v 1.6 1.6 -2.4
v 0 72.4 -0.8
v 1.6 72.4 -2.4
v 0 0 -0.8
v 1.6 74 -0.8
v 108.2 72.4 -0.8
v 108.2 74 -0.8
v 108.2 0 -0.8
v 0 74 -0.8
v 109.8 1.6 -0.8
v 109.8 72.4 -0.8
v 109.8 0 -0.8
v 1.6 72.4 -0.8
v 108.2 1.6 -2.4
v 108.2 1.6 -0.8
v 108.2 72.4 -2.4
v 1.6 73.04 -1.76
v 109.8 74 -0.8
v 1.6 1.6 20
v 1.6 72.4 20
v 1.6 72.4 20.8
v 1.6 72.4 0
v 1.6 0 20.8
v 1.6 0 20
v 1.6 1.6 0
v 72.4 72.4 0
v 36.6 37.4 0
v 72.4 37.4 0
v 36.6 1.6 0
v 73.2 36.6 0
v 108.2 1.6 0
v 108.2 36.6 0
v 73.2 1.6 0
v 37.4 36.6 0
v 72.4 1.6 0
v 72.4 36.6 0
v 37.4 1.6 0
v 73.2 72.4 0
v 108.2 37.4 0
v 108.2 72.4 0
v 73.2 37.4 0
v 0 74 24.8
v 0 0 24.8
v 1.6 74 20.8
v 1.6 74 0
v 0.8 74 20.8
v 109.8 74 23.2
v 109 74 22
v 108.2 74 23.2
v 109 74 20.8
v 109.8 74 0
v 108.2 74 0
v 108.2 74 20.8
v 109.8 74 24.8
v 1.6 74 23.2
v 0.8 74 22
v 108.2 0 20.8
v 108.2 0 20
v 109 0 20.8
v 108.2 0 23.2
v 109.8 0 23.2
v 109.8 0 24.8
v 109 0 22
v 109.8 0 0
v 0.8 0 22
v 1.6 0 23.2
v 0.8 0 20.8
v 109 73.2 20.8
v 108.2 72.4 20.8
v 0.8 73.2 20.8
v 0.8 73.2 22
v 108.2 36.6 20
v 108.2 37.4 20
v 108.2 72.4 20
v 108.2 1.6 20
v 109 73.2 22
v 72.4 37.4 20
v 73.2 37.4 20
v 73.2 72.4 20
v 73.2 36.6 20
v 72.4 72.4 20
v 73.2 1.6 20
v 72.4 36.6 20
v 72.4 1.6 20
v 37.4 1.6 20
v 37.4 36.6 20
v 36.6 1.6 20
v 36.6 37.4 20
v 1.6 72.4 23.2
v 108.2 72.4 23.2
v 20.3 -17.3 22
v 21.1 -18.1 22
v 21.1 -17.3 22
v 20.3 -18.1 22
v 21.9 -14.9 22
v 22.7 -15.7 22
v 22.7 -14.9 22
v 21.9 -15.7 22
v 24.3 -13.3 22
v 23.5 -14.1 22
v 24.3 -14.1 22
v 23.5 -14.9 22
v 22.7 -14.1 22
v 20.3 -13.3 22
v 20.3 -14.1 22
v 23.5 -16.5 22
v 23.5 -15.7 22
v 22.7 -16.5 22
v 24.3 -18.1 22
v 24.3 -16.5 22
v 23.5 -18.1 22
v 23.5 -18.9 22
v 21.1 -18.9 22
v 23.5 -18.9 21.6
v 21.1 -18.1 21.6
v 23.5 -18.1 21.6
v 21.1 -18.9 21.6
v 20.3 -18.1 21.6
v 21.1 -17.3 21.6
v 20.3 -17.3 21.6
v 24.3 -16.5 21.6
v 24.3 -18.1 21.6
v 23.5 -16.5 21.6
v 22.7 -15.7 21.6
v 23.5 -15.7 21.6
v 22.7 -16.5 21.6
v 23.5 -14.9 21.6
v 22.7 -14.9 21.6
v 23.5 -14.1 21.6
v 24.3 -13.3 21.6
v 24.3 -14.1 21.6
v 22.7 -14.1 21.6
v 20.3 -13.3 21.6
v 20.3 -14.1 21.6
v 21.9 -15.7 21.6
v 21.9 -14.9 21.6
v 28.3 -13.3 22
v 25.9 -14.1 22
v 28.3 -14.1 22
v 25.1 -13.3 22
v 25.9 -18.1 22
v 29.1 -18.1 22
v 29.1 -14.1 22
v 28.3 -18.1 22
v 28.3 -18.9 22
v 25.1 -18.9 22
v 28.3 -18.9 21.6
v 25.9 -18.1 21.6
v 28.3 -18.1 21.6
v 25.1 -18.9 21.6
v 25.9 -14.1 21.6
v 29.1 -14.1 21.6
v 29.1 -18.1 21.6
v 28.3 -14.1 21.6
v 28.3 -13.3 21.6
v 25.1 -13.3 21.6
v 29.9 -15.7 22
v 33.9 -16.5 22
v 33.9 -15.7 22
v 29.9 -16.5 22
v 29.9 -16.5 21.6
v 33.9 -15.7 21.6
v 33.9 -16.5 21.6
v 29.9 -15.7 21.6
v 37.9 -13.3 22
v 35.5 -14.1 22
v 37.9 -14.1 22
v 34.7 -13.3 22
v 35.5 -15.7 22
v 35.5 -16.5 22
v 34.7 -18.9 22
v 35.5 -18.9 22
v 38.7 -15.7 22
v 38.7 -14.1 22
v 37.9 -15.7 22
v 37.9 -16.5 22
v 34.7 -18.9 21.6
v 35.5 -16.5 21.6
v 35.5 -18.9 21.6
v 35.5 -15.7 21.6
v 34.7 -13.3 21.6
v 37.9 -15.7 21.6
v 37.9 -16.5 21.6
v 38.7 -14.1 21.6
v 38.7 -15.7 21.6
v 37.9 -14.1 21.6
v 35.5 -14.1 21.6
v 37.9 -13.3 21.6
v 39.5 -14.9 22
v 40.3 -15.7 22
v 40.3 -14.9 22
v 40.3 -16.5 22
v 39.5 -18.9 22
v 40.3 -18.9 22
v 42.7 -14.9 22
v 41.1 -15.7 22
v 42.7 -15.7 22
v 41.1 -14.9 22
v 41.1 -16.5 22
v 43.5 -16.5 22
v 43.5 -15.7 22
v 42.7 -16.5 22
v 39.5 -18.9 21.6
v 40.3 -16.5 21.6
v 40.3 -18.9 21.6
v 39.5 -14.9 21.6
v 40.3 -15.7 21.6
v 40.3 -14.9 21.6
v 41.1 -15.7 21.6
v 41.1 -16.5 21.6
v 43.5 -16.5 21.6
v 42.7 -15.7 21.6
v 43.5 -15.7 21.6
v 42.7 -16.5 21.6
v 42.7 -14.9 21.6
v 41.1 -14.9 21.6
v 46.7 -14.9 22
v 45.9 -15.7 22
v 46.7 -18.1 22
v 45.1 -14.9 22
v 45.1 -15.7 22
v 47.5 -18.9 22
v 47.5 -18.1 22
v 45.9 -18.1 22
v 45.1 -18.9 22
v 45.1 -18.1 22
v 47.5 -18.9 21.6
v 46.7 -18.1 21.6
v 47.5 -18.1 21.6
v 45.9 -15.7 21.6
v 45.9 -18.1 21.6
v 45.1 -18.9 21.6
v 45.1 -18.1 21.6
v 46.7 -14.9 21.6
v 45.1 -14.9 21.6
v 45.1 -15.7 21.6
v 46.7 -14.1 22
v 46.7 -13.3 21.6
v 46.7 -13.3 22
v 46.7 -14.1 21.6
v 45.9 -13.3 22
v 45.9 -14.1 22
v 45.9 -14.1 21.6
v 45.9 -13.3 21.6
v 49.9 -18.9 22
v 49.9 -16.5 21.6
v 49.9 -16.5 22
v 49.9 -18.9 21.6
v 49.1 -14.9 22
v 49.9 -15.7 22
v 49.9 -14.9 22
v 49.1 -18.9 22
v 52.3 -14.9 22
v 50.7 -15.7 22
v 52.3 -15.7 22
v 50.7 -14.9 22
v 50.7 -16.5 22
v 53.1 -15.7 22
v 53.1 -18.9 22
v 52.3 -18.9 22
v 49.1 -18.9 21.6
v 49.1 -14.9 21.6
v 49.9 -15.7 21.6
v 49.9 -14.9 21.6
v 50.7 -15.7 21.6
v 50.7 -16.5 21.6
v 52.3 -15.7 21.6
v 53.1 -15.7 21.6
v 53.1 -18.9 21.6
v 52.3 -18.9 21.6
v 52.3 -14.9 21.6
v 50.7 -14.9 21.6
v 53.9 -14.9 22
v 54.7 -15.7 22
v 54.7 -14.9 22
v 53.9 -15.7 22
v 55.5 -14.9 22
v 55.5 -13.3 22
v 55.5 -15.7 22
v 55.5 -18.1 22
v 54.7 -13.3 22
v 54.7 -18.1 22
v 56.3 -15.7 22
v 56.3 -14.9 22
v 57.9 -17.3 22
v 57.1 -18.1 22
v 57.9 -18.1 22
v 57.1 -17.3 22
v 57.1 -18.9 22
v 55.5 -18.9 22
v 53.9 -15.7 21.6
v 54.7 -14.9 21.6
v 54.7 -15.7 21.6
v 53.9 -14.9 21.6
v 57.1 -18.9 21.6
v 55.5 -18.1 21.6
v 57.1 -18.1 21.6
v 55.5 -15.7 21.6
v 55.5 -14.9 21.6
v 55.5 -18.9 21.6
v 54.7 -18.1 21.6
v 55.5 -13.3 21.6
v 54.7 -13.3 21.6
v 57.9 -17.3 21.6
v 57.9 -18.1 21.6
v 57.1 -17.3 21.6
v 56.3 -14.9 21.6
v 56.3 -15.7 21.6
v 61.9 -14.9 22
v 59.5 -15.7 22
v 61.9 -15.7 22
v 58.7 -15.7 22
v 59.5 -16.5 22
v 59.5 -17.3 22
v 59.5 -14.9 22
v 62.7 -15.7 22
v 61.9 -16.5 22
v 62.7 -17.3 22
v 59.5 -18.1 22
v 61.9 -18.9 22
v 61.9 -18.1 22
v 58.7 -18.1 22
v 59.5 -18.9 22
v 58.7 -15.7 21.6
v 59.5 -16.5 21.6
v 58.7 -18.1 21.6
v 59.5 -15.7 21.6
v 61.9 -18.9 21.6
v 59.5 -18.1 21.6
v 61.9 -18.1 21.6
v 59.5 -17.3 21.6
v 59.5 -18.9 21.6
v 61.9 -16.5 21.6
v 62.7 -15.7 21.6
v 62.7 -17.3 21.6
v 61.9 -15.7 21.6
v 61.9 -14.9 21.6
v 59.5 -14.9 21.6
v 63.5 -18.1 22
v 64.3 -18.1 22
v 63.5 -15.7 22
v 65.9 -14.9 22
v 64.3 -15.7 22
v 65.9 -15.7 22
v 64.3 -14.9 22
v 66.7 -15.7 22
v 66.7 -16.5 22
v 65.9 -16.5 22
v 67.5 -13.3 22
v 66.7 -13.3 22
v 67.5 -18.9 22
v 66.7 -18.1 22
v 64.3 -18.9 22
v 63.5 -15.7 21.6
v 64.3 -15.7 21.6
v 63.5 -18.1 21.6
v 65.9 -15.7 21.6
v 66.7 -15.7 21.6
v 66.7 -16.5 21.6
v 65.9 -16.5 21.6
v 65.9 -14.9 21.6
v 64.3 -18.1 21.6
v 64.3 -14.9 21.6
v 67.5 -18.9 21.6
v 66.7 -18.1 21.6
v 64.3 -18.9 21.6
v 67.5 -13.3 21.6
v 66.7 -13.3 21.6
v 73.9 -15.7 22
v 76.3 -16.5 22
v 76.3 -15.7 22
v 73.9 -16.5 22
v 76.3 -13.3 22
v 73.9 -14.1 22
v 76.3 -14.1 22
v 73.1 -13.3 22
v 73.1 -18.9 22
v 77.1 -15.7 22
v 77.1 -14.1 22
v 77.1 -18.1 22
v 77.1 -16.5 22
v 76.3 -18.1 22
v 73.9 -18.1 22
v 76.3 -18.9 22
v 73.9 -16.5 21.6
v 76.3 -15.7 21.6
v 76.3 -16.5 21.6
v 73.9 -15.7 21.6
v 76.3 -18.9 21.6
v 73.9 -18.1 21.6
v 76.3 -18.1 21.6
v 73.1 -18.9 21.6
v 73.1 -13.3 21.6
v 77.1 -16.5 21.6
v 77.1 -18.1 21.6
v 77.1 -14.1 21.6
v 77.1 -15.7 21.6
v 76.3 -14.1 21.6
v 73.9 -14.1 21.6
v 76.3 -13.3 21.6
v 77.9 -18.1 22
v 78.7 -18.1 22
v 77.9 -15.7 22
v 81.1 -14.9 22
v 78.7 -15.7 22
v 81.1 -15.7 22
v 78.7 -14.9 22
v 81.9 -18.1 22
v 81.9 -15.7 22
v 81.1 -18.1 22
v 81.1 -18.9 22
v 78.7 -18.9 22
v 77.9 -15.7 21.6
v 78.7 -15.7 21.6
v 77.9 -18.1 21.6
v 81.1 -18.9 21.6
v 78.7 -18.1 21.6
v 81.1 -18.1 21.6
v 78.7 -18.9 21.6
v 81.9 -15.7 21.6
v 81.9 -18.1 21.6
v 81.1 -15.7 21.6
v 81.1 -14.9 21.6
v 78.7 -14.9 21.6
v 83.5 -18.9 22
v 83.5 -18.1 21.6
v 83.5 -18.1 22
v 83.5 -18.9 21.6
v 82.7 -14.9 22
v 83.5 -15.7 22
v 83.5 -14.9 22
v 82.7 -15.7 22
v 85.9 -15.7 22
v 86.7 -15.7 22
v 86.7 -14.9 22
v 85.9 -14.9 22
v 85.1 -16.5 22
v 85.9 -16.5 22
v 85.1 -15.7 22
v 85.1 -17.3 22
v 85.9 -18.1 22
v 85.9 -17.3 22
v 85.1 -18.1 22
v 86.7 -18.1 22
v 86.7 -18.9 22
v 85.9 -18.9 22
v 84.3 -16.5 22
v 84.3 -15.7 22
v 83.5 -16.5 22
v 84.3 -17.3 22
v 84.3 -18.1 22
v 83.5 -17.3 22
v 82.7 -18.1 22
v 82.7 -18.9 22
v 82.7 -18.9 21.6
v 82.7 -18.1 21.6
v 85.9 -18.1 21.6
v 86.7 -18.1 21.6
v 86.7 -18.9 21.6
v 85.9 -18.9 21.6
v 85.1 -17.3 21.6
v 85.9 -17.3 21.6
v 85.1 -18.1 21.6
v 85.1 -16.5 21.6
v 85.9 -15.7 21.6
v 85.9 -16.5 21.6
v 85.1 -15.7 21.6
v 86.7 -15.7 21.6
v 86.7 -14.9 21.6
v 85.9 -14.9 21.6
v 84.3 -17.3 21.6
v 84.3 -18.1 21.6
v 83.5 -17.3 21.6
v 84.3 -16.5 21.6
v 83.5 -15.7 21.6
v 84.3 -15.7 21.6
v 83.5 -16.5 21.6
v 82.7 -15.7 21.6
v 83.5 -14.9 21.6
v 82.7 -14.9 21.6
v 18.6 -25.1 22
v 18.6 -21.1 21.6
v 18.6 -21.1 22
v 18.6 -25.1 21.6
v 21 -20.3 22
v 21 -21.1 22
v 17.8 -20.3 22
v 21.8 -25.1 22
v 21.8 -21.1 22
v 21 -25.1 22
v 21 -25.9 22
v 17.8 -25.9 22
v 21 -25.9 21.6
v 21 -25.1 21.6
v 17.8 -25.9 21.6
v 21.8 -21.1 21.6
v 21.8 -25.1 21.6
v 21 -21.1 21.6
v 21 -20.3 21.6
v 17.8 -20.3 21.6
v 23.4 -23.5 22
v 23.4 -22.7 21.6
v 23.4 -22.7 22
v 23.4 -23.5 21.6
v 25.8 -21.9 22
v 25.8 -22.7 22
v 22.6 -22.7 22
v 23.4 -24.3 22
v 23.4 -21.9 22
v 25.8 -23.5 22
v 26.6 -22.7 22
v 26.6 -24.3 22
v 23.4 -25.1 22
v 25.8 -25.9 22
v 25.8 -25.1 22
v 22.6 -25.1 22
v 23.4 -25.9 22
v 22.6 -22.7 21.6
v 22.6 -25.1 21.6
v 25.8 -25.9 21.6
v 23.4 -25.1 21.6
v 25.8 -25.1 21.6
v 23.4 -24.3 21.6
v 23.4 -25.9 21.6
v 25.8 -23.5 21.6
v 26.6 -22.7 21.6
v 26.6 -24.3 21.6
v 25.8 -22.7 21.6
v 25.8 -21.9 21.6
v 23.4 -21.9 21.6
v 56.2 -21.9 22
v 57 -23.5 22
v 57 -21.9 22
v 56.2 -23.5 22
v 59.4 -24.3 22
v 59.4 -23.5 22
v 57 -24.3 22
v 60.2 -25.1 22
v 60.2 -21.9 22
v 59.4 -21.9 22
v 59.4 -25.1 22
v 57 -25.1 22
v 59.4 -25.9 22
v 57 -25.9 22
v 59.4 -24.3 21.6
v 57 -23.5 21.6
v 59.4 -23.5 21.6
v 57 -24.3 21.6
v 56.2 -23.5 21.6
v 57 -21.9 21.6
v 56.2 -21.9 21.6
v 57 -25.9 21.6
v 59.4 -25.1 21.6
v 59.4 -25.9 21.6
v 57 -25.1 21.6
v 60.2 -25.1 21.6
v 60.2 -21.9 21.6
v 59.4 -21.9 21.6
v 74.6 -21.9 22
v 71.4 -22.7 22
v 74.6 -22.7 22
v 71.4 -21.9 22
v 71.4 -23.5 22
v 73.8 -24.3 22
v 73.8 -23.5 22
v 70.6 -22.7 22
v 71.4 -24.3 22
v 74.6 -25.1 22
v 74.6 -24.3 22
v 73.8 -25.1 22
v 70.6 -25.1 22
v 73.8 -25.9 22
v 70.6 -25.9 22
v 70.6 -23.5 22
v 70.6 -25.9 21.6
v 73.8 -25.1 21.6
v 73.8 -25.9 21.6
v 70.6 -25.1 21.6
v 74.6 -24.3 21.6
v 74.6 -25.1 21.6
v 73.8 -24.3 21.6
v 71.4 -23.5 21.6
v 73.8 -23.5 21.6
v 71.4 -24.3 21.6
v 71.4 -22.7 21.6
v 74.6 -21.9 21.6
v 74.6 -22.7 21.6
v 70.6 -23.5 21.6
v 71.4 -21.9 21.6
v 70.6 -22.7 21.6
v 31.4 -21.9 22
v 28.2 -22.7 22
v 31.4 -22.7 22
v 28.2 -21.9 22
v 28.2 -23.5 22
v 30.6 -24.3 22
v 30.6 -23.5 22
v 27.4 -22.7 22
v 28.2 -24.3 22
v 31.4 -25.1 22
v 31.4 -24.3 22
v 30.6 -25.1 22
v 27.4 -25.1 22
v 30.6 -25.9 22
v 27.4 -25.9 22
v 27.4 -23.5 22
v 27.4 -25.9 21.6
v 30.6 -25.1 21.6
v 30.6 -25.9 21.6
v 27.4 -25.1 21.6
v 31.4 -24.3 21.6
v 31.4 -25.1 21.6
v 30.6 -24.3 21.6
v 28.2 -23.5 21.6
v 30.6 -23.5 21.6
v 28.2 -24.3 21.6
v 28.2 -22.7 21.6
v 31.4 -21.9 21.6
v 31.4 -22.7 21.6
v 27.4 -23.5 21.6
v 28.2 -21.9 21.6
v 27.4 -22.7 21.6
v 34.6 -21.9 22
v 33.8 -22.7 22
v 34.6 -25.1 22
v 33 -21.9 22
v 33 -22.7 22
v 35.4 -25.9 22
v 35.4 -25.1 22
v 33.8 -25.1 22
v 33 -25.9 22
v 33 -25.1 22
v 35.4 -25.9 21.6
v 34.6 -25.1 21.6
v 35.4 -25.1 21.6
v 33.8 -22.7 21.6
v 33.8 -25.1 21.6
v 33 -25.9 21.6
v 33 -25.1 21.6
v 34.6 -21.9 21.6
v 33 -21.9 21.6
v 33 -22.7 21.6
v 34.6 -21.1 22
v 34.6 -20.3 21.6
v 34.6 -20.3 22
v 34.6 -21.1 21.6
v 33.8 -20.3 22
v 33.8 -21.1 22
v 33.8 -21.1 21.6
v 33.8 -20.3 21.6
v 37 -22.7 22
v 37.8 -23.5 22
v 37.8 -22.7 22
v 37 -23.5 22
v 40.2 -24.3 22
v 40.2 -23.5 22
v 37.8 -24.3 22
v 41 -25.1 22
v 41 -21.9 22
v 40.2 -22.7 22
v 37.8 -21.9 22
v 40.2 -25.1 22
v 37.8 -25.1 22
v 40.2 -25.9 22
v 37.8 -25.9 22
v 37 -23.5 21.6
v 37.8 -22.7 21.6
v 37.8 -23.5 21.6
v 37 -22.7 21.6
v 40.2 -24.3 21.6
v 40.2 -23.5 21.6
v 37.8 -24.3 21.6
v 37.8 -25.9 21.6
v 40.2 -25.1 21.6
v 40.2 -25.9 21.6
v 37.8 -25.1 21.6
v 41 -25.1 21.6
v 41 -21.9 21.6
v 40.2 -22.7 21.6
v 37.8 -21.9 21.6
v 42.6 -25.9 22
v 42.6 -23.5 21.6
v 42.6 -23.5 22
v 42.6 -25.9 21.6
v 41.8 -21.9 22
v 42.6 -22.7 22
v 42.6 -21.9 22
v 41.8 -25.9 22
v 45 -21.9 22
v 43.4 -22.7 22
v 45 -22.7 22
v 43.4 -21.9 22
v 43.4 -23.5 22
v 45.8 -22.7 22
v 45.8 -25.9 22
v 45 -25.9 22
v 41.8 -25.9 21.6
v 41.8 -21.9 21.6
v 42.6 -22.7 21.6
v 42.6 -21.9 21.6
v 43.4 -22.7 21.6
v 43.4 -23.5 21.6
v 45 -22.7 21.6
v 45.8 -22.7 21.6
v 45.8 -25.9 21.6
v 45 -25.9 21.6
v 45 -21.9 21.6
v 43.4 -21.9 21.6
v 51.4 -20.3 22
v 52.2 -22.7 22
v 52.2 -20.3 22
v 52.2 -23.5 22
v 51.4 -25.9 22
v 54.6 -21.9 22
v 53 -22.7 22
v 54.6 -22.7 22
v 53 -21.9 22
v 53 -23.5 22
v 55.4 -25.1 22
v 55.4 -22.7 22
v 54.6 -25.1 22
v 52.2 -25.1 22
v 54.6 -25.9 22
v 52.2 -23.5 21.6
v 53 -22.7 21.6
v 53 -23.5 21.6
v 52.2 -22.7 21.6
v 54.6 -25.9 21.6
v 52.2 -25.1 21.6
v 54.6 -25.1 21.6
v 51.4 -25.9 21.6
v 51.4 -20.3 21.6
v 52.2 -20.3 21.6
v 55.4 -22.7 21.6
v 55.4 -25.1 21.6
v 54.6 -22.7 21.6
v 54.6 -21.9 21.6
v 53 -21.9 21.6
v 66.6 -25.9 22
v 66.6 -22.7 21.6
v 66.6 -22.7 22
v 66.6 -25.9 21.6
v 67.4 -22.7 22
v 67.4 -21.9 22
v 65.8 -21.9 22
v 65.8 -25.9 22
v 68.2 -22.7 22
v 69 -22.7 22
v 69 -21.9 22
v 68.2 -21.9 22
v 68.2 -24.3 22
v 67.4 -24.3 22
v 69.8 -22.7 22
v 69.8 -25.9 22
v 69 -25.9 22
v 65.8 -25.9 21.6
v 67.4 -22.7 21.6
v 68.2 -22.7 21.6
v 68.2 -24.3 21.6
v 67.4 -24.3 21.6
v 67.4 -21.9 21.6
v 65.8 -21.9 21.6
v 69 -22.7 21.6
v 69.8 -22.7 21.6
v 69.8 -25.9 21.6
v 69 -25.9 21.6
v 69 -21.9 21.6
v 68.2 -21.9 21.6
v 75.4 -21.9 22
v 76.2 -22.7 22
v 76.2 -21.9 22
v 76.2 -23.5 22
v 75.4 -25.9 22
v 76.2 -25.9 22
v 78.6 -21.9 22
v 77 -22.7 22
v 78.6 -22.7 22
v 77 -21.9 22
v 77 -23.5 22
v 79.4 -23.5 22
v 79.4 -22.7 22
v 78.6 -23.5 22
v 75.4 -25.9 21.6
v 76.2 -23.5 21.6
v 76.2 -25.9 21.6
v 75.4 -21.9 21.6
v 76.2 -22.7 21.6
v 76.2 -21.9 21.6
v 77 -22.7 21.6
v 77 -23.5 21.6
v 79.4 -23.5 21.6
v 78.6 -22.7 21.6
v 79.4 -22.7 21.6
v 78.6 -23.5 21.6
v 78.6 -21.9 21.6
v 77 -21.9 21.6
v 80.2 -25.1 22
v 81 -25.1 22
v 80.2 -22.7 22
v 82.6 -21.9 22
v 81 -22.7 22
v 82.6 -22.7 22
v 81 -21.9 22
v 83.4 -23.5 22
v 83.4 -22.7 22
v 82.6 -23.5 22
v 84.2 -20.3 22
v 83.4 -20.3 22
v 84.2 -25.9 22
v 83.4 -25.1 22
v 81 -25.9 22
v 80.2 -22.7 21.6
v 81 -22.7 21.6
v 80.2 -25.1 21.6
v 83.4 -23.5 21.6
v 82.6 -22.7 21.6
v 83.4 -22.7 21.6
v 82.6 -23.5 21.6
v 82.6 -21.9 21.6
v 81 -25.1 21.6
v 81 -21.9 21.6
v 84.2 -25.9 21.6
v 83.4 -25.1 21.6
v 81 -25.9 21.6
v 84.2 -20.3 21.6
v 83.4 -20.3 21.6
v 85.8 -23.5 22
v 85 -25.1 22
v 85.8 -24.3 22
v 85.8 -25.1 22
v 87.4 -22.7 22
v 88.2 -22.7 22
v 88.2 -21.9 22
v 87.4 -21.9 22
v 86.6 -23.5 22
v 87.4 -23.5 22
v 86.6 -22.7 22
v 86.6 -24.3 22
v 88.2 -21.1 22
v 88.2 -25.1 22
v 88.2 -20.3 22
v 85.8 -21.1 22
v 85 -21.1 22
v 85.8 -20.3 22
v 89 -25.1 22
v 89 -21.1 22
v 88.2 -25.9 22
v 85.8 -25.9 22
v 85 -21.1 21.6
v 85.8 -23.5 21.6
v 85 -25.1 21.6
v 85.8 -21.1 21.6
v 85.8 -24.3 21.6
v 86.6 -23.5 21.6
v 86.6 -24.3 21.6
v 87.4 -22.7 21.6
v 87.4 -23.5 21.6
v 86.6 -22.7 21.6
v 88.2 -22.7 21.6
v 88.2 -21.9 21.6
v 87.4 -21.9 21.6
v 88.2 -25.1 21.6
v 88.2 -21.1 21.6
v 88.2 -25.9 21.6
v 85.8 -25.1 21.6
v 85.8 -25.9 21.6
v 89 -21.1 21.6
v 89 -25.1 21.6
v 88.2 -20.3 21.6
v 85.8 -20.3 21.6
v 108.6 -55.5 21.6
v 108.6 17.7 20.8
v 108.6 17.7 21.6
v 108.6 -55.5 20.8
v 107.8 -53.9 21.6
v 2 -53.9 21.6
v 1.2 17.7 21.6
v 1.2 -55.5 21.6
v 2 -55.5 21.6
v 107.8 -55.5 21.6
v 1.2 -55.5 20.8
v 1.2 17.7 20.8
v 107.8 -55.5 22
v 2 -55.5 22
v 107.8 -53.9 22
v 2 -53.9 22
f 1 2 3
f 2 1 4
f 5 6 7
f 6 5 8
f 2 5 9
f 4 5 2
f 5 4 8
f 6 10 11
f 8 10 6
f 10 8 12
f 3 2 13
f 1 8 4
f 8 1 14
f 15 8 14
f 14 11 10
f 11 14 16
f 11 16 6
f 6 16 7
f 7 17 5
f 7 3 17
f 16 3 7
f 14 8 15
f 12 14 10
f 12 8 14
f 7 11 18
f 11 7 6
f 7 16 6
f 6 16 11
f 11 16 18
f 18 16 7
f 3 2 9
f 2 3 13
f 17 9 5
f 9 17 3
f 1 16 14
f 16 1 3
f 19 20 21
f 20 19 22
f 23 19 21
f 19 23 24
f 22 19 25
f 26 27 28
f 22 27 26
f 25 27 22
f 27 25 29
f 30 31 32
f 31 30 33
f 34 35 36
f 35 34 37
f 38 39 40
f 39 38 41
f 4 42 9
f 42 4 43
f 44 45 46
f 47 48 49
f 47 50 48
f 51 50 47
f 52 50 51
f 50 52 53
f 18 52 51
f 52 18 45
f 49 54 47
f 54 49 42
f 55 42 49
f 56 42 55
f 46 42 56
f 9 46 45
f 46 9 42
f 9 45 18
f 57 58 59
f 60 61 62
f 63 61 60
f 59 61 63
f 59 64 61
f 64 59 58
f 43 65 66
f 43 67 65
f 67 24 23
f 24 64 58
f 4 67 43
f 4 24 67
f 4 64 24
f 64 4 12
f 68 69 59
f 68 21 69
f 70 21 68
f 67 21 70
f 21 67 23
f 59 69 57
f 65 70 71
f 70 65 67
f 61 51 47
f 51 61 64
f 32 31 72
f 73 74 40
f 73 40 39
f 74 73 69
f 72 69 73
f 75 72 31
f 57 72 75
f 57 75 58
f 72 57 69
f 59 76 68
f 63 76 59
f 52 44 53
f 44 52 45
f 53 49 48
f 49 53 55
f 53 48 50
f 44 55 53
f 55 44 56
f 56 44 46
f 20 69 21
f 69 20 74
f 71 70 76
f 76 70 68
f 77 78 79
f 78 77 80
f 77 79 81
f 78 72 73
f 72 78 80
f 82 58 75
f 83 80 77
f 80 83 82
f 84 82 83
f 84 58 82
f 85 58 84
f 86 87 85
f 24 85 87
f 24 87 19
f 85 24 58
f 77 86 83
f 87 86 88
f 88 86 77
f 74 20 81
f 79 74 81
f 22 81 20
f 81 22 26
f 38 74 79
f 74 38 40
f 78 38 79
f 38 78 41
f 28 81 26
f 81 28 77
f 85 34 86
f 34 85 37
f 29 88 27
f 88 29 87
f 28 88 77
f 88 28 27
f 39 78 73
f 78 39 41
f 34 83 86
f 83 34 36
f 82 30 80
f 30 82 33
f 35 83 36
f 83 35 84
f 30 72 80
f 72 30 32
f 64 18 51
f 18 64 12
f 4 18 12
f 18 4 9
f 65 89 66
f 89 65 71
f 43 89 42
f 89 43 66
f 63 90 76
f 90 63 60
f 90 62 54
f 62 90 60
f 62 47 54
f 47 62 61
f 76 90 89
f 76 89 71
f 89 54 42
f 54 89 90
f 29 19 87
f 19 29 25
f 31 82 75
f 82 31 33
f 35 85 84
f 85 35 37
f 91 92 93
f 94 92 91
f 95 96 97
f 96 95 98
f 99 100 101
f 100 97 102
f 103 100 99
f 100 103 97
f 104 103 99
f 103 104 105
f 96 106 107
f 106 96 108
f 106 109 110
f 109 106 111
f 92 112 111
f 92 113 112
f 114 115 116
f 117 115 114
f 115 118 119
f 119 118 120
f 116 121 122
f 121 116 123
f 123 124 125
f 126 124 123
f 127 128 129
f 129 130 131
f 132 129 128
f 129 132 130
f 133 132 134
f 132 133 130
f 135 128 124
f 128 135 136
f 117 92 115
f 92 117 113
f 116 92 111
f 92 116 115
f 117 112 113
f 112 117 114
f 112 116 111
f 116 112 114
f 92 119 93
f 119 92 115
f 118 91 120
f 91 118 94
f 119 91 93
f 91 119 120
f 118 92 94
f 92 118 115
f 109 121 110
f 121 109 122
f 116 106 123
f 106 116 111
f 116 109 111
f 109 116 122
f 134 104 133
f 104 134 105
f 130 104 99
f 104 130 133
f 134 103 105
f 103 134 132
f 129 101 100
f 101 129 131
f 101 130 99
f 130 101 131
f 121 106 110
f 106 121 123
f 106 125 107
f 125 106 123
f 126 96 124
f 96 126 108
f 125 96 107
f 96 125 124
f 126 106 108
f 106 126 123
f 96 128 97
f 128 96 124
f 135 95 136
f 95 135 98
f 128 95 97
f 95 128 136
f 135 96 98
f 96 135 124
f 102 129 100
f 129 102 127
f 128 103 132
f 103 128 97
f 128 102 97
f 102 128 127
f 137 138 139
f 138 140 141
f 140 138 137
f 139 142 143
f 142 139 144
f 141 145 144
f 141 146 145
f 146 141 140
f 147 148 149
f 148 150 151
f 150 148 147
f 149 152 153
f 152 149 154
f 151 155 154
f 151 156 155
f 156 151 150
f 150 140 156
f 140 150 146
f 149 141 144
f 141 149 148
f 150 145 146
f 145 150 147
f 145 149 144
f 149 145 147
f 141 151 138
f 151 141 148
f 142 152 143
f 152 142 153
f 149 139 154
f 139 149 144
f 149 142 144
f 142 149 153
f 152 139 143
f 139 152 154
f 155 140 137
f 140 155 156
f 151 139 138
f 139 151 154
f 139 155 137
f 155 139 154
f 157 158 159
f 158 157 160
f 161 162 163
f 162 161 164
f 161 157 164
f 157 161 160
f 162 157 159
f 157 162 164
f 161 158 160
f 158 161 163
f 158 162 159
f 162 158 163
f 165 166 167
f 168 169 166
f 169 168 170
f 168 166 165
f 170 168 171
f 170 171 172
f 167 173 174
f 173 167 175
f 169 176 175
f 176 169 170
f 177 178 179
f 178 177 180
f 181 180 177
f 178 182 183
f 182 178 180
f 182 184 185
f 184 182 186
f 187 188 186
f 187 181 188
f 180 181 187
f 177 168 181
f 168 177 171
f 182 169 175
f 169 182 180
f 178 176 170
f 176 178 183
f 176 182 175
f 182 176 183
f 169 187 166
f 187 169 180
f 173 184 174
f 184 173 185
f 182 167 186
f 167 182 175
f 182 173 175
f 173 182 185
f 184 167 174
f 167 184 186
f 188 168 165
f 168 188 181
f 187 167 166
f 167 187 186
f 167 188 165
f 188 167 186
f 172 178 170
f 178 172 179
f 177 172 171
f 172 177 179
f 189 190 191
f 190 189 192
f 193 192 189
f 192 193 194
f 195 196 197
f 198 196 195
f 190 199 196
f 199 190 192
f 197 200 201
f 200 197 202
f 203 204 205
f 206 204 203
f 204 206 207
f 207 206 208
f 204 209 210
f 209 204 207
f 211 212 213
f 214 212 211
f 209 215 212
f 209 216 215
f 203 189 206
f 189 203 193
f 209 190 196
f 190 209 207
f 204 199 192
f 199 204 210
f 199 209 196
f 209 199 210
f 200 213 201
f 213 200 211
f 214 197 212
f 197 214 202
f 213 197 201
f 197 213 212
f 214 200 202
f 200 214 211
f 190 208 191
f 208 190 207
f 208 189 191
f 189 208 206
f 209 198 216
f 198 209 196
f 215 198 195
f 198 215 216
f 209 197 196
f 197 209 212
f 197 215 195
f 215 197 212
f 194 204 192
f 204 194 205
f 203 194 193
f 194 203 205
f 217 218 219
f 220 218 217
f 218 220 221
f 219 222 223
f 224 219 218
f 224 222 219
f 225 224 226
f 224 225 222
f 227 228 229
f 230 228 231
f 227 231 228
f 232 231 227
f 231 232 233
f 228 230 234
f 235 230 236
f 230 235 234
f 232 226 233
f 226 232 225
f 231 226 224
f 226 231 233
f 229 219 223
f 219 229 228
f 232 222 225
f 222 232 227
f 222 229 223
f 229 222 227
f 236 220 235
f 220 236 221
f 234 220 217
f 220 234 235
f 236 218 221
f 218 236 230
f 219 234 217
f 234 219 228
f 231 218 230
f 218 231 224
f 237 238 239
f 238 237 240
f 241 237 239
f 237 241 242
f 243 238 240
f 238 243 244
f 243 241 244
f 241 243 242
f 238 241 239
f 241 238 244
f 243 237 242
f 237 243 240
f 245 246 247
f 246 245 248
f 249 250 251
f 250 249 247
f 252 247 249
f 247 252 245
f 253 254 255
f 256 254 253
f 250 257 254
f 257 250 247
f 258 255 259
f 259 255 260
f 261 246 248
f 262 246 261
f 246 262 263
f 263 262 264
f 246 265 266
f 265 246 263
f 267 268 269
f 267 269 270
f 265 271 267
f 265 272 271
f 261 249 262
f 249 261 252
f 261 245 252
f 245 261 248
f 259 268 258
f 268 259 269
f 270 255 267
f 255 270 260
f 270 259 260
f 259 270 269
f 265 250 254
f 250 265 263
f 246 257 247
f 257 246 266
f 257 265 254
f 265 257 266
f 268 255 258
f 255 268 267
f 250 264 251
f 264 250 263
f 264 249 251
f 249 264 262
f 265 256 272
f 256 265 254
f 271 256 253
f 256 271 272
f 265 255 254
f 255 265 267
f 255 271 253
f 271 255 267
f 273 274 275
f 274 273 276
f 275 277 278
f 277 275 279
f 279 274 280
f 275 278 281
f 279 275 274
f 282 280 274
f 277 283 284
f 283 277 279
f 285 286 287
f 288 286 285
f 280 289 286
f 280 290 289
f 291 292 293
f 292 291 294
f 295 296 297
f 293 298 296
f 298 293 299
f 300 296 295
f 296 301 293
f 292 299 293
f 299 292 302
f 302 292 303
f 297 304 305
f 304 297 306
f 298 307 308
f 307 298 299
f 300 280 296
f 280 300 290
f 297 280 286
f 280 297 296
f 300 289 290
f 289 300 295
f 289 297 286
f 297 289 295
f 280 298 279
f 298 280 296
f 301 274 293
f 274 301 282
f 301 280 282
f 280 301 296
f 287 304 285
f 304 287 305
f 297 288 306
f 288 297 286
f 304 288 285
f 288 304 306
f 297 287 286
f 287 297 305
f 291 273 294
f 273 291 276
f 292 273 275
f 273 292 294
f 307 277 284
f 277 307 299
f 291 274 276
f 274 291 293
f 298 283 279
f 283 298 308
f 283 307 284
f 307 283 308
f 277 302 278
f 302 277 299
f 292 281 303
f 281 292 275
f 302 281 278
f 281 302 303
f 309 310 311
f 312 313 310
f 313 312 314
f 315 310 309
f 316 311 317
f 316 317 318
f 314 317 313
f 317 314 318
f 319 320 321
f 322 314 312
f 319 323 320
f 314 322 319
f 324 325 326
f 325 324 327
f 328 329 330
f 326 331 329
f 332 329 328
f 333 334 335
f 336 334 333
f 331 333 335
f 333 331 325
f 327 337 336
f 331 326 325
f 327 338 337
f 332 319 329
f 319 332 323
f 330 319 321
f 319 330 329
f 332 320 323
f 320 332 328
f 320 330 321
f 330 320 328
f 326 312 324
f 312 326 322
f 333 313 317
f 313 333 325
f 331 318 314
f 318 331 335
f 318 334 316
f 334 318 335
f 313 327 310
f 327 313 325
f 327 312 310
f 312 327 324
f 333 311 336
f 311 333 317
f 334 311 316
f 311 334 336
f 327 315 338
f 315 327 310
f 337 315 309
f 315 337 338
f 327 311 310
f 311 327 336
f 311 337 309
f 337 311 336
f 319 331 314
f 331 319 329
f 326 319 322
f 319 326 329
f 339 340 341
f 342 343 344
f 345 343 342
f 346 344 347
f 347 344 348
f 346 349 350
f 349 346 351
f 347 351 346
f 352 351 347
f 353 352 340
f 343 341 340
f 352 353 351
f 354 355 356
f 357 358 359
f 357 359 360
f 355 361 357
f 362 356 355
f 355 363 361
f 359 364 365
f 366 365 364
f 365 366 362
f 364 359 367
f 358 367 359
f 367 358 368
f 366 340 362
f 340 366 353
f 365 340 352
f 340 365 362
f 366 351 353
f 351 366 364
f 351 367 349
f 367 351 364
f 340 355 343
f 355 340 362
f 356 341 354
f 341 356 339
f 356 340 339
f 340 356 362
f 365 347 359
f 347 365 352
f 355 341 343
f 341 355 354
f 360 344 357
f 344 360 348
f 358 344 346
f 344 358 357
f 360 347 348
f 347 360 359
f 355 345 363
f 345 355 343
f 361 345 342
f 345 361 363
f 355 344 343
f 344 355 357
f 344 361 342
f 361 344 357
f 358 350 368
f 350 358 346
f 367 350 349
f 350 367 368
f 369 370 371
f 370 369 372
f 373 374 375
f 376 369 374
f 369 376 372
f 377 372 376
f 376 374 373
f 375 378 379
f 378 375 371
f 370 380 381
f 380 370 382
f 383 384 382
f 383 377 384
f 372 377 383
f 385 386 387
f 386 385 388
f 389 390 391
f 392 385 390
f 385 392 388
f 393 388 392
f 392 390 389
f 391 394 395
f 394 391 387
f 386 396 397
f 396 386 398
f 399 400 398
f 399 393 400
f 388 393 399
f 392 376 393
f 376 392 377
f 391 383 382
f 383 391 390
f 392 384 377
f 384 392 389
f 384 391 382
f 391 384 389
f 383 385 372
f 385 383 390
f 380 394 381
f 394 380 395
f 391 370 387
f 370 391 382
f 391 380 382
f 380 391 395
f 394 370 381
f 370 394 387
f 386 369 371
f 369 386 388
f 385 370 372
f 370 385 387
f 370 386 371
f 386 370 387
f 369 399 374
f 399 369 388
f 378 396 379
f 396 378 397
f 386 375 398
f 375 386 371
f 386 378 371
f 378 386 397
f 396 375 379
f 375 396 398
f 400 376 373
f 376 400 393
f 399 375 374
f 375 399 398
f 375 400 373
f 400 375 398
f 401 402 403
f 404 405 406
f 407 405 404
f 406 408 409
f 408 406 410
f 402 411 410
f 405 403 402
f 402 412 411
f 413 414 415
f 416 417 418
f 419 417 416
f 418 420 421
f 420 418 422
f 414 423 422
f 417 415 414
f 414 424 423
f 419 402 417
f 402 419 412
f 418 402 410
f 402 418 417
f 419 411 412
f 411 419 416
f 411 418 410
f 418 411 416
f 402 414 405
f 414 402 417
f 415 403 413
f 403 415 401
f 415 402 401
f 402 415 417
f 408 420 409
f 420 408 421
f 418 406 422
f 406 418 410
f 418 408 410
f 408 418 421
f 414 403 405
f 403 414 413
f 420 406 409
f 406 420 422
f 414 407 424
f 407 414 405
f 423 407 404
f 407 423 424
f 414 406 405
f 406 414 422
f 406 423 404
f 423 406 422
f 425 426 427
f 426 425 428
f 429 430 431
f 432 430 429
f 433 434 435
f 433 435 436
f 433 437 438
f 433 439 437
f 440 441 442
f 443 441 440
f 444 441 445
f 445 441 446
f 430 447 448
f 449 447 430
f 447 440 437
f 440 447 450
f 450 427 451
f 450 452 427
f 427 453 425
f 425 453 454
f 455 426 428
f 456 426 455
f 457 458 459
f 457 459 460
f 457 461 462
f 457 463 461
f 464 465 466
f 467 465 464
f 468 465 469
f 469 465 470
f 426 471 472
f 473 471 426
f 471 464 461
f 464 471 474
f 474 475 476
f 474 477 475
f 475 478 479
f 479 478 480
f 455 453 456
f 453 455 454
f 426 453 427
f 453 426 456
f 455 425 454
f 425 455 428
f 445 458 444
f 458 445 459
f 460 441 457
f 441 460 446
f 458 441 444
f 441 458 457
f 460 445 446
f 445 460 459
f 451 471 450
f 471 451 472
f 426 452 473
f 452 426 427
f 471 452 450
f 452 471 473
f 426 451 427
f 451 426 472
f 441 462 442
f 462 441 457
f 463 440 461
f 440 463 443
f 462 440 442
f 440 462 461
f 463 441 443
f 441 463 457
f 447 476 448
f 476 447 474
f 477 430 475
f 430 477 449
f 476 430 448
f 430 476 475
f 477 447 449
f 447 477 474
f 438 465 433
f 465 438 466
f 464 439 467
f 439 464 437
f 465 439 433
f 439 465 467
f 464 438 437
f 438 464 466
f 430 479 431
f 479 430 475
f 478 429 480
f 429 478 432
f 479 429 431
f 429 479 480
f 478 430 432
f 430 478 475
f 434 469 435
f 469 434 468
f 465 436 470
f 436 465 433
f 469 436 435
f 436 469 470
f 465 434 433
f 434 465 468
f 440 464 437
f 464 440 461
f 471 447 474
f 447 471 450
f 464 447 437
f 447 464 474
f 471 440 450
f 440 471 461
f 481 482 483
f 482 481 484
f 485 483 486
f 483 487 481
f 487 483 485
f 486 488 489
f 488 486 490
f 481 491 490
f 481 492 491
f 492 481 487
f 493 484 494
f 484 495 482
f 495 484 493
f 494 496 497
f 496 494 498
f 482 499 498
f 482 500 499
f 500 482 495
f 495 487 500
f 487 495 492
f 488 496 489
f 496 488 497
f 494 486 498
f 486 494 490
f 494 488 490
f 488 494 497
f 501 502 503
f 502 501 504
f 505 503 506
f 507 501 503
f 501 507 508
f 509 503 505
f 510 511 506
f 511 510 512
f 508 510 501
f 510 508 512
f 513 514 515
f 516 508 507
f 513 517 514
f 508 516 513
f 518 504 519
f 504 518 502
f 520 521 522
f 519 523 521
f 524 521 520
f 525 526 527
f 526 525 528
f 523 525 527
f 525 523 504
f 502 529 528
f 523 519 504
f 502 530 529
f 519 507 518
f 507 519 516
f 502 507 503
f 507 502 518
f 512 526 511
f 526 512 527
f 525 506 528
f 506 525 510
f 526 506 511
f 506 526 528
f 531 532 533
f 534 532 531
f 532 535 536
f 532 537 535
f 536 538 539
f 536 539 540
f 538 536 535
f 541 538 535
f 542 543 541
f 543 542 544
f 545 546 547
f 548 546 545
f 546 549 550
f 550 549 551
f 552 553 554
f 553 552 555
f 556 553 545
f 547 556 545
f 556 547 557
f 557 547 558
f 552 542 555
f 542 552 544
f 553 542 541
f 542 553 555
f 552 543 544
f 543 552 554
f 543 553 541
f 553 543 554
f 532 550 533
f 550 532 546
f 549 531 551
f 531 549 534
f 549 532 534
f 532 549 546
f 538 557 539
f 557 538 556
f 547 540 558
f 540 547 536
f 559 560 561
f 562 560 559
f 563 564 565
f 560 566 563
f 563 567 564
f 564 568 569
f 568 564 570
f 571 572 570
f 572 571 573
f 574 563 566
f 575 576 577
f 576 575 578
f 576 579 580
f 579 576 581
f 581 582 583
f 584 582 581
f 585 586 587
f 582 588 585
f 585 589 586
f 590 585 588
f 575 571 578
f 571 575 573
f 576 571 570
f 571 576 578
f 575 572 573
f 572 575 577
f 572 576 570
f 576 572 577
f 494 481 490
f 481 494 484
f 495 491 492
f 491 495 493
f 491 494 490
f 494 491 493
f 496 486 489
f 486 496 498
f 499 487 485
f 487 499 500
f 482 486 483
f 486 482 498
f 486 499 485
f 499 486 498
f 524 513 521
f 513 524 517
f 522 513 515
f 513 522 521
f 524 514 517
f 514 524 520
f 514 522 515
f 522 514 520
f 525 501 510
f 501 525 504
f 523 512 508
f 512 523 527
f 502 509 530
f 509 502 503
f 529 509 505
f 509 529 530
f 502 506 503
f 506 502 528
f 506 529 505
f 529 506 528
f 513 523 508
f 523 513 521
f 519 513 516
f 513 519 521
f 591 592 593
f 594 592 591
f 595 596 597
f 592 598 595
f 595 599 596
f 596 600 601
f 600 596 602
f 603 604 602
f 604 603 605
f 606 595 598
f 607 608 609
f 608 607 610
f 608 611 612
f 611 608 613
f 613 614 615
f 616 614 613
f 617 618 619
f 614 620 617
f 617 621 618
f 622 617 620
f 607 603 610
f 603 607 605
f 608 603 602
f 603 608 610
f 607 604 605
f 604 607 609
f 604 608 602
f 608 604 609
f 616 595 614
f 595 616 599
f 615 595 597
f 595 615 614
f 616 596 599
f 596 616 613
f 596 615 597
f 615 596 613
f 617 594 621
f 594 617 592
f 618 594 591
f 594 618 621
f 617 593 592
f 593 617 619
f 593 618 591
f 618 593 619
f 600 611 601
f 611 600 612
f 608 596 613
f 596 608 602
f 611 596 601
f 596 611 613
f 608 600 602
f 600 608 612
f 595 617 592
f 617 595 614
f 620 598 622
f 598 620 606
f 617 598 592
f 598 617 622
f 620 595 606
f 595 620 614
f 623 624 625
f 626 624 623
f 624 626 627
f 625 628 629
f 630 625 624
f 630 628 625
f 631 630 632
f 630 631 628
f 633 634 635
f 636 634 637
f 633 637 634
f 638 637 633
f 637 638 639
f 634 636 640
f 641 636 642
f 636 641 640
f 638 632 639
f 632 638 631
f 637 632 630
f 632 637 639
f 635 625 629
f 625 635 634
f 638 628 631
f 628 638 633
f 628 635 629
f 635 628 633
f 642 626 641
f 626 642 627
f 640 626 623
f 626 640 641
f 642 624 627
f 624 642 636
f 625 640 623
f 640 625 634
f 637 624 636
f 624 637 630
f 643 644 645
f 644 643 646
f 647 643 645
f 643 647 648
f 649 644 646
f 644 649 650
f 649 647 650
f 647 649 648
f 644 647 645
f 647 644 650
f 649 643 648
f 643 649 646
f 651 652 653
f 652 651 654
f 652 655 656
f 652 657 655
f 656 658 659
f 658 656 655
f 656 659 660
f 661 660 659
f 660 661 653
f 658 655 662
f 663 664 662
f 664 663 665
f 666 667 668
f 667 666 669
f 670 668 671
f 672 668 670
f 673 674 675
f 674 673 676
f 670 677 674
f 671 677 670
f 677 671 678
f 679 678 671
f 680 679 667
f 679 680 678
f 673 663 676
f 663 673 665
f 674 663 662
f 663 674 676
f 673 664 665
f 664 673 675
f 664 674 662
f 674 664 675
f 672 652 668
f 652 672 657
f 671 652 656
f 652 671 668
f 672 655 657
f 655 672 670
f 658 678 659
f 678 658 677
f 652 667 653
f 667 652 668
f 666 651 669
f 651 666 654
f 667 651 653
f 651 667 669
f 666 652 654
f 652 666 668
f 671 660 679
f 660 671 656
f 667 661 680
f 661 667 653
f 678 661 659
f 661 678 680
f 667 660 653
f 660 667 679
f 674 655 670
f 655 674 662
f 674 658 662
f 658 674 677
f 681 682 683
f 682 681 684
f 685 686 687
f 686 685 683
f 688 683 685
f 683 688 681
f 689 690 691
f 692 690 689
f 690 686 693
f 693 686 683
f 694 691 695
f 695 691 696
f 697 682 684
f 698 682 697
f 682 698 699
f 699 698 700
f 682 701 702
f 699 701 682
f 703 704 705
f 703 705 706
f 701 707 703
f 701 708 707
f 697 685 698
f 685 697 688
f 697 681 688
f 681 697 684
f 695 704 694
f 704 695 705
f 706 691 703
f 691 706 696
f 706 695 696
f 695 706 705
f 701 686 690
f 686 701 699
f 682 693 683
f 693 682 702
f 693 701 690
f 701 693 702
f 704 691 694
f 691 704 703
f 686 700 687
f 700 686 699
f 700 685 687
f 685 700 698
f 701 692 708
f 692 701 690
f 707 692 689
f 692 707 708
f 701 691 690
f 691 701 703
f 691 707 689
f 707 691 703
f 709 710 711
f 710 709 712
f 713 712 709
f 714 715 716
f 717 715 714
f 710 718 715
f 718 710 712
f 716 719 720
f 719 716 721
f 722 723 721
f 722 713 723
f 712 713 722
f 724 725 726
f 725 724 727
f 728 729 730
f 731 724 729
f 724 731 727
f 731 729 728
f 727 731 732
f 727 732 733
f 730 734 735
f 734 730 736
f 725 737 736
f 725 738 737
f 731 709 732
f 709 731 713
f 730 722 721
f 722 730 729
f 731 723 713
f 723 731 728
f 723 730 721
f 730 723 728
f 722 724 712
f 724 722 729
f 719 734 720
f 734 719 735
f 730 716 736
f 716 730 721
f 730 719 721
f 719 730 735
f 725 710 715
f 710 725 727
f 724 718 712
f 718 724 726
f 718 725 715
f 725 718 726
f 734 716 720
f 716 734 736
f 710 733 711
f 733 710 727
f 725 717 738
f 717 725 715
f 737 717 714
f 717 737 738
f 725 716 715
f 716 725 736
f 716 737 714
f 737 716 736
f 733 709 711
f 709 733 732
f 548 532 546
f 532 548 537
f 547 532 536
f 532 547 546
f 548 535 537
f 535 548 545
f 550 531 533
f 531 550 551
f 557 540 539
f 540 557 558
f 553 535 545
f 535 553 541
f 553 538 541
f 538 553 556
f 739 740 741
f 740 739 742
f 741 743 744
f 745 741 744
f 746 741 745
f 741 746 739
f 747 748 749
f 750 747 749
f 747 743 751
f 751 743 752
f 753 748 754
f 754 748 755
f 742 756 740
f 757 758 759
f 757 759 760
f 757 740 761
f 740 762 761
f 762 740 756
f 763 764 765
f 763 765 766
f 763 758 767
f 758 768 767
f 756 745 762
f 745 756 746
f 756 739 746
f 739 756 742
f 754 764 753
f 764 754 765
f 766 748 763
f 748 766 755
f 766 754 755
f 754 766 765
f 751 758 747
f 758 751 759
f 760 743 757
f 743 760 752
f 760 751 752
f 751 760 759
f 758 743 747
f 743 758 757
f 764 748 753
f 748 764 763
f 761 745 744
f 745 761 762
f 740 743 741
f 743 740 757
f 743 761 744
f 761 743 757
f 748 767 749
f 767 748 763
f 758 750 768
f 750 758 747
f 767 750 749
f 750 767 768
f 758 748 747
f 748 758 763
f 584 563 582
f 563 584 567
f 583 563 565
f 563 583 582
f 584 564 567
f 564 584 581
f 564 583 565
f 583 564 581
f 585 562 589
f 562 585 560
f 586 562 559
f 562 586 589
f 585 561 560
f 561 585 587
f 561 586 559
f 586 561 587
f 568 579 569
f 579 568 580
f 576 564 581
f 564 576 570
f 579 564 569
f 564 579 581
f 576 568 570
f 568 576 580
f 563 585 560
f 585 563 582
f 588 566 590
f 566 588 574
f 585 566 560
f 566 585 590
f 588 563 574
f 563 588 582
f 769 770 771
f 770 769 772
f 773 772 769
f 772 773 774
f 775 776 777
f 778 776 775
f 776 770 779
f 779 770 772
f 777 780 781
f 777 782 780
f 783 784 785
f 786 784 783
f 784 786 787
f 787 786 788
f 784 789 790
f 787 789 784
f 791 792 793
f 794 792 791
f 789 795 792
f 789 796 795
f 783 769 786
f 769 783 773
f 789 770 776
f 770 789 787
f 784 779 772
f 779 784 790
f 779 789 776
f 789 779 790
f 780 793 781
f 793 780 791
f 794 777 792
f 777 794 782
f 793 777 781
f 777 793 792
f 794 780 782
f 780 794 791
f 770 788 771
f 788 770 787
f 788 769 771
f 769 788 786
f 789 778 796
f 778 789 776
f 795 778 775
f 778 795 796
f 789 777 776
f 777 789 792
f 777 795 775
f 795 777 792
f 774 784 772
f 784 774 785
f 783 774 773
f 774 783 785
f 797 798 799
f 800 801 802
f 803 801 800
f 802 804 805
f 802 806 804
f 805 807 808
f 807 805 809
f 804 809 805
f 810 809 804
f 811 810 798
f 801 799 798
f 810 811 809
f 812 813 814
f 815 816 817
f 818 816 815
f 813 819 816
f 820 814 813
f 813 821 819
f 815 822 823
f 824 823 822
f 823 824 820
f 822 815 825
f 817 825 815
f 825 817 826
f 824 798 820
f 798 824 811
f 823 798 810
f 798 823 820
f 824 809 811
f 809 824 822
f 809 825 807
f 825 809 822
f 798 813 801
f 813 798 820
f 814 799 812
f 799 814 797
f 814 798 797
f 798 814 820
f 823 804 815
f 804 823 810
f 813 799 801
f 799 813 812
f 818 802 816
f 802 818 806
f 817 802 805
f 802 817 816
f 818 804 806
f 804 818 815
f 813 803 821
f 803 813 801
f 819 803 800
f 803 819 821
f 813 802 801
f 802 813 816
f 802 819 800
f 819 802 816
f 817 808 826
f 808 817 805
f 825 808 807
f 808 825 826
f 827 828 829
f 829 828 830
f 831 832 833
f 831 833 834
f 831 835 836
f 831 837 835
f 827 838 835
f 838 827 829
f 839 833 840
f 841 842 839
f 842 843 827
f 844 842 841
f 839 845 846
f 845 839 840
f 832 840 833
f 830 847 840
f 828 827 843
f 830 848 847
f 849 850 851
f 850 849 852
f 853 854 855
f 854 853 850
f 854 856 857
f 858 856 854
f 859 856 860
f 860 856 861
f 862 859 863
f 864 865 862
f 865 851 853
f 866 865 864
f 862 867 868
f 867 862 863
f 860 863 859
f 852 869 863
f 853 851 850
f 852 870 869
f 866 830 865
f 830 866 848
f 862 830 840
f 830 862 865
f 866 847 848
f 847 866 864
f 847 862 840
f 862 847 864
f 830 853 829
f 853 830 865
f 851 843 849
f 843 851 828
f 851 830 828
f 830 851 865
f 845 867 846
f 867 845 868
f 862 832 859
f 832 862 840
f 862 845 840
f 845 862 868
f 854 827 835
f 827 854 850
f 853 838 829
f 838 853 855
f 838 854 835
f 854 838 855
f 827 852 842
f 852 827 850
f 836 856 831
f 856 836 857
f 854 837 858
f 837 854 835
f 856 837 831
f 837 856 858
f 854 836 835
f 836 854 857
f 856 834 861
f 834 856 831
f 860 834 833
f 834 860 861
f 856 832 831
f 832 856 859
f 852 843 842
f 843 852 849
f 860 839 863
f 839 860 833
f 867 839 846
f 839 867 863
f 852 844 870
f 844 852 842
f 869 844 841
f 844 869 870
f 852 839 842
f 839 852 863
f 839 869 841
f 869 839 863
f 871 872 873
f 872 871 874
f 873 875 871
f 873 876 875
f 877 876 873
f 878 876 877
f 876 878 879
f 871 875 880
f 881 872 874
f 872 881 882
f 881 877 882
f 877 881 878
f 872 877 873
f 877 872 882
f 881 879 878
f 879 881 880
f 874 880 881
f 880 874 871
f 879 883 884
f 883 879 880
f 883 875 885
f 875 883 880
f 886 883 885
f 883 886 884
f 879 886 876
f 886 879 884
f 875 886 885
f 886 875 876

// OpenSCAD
// ### CONFIGURATION ###

// For each line the box should get, add an entry
// Each entry has as many entries as there should
// be shelves. For each shelf, write the number of
// shelf elements in width. If you enter a 0, there
// will be no wall above, so you can extend the 
// one above.
config = [
	[ 2, 1 ],
	[ 0, 1, 1 ]
];

// the default size of a box
boxsize = 35;
// the height of the boxes
boxheight = 20;

// the text to appear on top of the lid
txt = ["3D-Printed Box", "Design by msrd0"];

// the thickness of the walls (outer walls will
// be twice of the thickness)
// I'd set this to twice the nozzle size
thn = 0.8;

// the part to be printed - zero to see all parts assembled
part = 0;
//part = 1;
//part = 2;

// ### END CONFIGURATION ###

// all credits for this method go to http://www.thingiverse.com/thing:59817
module drawtext(text) {
	//Characters
	chars = " !\"#$%&'()*+,-./0123456789:;<=>?@ABCDEFGHIJKLMNOPQRSTUVWXYZ[\\]^_`abcdefghijklmnopqrstuvwxyz{|}";

	//Chracter table defining 5x7 characters
	//Adapted from: http://www.geocities.com/dinceraydin/djlcdsim/chartable.js
	char_table = [ [ 0, 0, 0, 0, 0, 0, 0],
                  [ 4, 0, 4, 4, 4, 4, 4],
                  [ 0, 0, 0, 0,10,10,10],
                  [10,10,31,10,31,10,10],
                  [ 4,30, 5,14,20,15, 4],
                  [ 3,19, 8, 4, 2,25,24],
                  [13,18,21, 8,20,18,12],
                  [ 0, 0, 0, 0, 8, 4,12],
                  [ 2, 4, 8, 8, 8, 4, 2],
                  [ 8, 4, 2, 2, 2, 4, 8],
                  [ 0, 4,21,14,21, 4, 0],
                  [ 0, 4, 4,31, 4, 4, 0],
                  [ 8, 4,12, 0, 0, 0, 0],
                  [ 0, 0, 0,31, 0, 0, 0],
                  [12,12, 0, 0, 0, 0, 0],
                  [ 0,16, 8, 4, 2, 1, 0],
                  [14,17,25,21,19,17,14],
                  [14, 4, 4, 4, 4,12, 4],
                  [31, 8, 4, 2, 1,17,14],
                  [14,17, 1, 2, 4, 2,31],
                  [ 2, 2,31,18,10, 6, 2],
                  [14,17, 1, 1,30,16,31],
                  [14,17,17,30,16, 8, 6],
                  [ 8, 8, 8, 4, 2, 1,31],
                  [14,17,17,14,17,17,14],
                  [12, 2, 1,15,17,17,14],
                  [ 0,12,12, 0,12,12, 0],
                  [ 8, 4,12, 0,12,12, 0],
                  [ 2, 4, 8,16, 8, 4, 2],
                  [ 0, 0,31, 0,31, 0, 0],
                  [16, 8, 4, 2, 4, 8,16],
                  [ 4, 0, 4, 2, 1,17,14],
                  [14,21,21,13, 1,17,14],
                  [17,17,31,17,17,17,14],
                  [30,17,17,30,17,17,30],
                  [14,17,16,16,16,17,14],
                  [30,17,17,17,17,17,30],
                  [31,16,16,30,16,16,31],
                  [16,16,16,30,16,16,31],
                  [15,17,17,23,16,17,14],
                  [17,17,17,31,17,17,17],
                  [14, 4, 4, 4, 4, 4,14],
                  [12,18, 2, 2, 2, 2, 7],
                  [17,18,20,24,20,18,17],
                  [31,16,16,16,16,16,16],
                  [17,17,17,21,21,27,17],
                  [17,17,19,21,25,17,17],
                  [14,17,17,17,17,17,14],
                  [16,16,16,30,17,17,30],
                  [13,18,21,17,17,17,14],
                  [17,18,20,30,17,17,30],
                  [30, 1, 1,14,16,16,15],
                  [ 4, 4, 4, 4, 4, 4,31],
                  [14,17,17,17,17,17,17],
                  [ 4,10,17,17,17,17,17],
                  [10,21,21,21,17,17,17],
                  [17,17,10, 4,10,17,17],
                  [ 4, 4, 4,10,17,17,17],
                  [31,16, 8, 4, 2, 1,31],
                  [14, 8, 8, 8, 8, 8,14],
                  [ 0, 1, 2, 4, 8,16, 0],
                  [14, 2, 2, 2, 2, 2,14],
                  [ 0, 0, 0, 0,17,10, 4],
                  [31, 0, 0, 0, 0, 0, 0],
                  [ 0, 0, 0, 0, 2, 4, 8],
                  [15,17,15, 1,14, 0, 0],
                  [30,17,17,25,22,16,16],
                  [14,17,16,16,14, 0, 0],
                  [15,17,17,19,13, 1, 1],
                  [14,16,31,17,14, 0, 0],
                  [ 8, 8, 8,28, 8, 9, 6],
                  [14, 1,15,17,15, 0, 0],
                  [17,17,17,25,22,16,16],
                  [14, 4, 4, 4,12, 0, 4],
                  [12,18, 2, 2, 2, 6, 2],
                  [18,20,24,20,18,16,16],
                  [14, 4, 4, 4, 4, 4,12],
                  [17,17,21,21,26, 0, 0],
                  [17,17,17,25,22, 0, 0],
                  [14,17,17,17,14, 0, 0],
                  [16,16,30,17,30, 0, 0],
                  [ 1, 1,15,19,13, 0, 0],
                  [16,16,16,25,22, 0, 0],
                  [30, 1,14,16,15, 0, 0],
                  [ 6, 9, 8, 8,28, 8, 8],
                  [13,19,17,17,17, 0, 0],
                  [ 4,10,17,17,17, 0, 0],
                  [10,21,21,17,17, 0, 0],
                  [17,10, 4,10,17, 0, 0],
                  [14, 1,15,17,17, 0, 0],
                  [31, 8, 4, 2,31, 0, 0],
                  [ 2, 4, 4, 8, 4, 4, 2],
                  [ 4, 4, 4, 4, 4, 4, 4],
                  [ 8, 4, 4, 2, 4, 4, 8] ];

	//Binary decode table
	dec_table = [ "00000", "00001", "00010", "00011", "00100", "00101",
  	            "00110", "00111", "01000", "01001", "01010", "01011",
  	            "01100", "01101", "01110", "01111", "10000", "10001",
  	            "10010", "10011", "10100", "10101", "10110", "10111",
	            "11000", "11001", "11010", "11011", "11100", "11101",
	            "11110", "11111" ];

	//Process string one character at a time
	for(itext = [0:len(text)-1]) {
		//Convert character to index
		ichar = search(text[itext],chars,1)[0];

        //Decode character - rows
        for(irow = [0:6]) {
            //Select value to draw from table
            val = dec_table[char_table[ichar][irow]];

            //Decode character - cols
            for(icol = [0:4]) {
                // Retrieve bit to draw
                bit = search(val[icol],"01",1)[0];

                if(bit) {
                    //Output cube
                    translate([icol + (6*itext), irow, 0])
                        cube([1.0001,1.0001,1]);
                }
            }
        }
	}
}


function sum(list, maxi=-1, idx=0, result=0) = idx>=(maxi==-1 ? len(list) : maxi) ? result : sum(list, maxi, idx+1, result+list[idx]);

// count the number of shelves
nx = sum(config[0]);
ny = len(config);

// calc width, depth and height
w0 = nx*boxsize + (nx+3)*thn;
d0 = ny*boxsize + (ny+3)*thn;
h0 = boxheight + 8*thn;

module prismy(c, dir=1) {
	polyhedron(
		points = [[0,0,0], [c[0],0,0], [c[0],c[1],0], [0,c[1],0], [0,dir*c[1],c[2]], [c[0],dir*c[1],c[2]]],
		faces = [[0,1,2,3],[5,4,3,2],[0,4,5,1],[0,3,4],[5,2,1]]
	);
}
module prismx(c, dir=1) {
	translate([0, c[1], 0])
	rotate([0,0,-90])
	prismy([c[1], c[0], c[2]], dir);
}
module prismzy(c, dir=1) {
	polyhedron(
		points = [[0,0,c[2]], [c[0],0,c[2]], [c[0],dir*c[1],0], [0,dir*c[1],0], [0,c[1],c[2]], [c[0],c[1],c[2]]],
		faces = [[0,1,2,3],[5,4,3,2],[0,4,5,1],[0,3,4],[5,2,1]]
	);
}
module prismzx(c, dir=1) {
	translate([0, c[1], 0])
	rotate([0,0,-90])
	prismzy([c[1], c[0], c[2]], dir);
}

module box() {
	// very bottom
	translate([0, 0, -3*thn]) {
		translate([2*thn, 2*thn, 0])
			cube([w0-4*thn, d0-4*thn, 2*thn]);
		union() {
			// left
			translate([0, 2*thn, 0])
				prismzx([2*thn, d0-4*thn, 2*thn]);
			// front
			translate([2*thn, 0, 0])
				prismzy([w0-4*thn, 2*thn, 2*thn]);
			// right
			translate([w0-2*thn, 2*thn, 0])
				prismzx([2*thn, d0-4*thn, 2*thn], 0);
			// back
			translate([2*thn, d0-2*thn, 0])
				prismzy([w0-4*thn, 2*thn, 2*thn], 0);
		}
		// left front
		intersection() {
			prismzx([2*thn, 2*thn, 2*thn]);
			prismzy([2*thn, 2*thn, 2*thn]);
		}
		// right front
		translate([w0-2*thn, 0, 0])
		intersection() {
			prismzx([2*thn, 2*thn, 2*thn], 0);
			prismzy([2*thn, 2*thn, 2*thn]);
		}
		// right back
		translate([w0-2*thn, d0-2*thn, 0])
		intersection() {
			prismzx([2*thn, 2*thn, 2*thn], 0);
			prismzy([2*thn, 2*thn, 2*thn], 0);
		}
		// left back
		translate([0, d0-2*thn, 0])
		intersection() {
			prismzx([2*thn, 2*thn, 2*thn]);
			prismzy([2*thn, 2*thn, 2*thn], 0);
		}
	}
	// bottom
	translate([0, 0, -thn])
		cube([w0, d0, thn]);
	
	// left
	difference() {
		cube([2*thn, d0, boxheight+4*thn]);
		translate([thn, -1, boxheight+thn])
			cube([thn+1, d0+2, 3*thn]);
	}
	translate([thn, 0, boxheight+2*thn+thn/2])
		prismzx([thn, d0, thn+thn/2], 0);
	translate([0, 0, boxheight+4*thn])
		prismx([2*thn, d0, 2*thn], 0);
	// right
	translate([w0-2*thn, 0, 0])
	difference() {
		cube([2*thn, d0, boxheight+4*thn]);
		translate([-1, -1, boxheight+thn])
			cube([thn+1, d0+2, 3*thn]);
	}
	translate([w0-2*thn, 0, boxheight+2*thn+thn/2])
		prismzx([thn, d0, thn+thn/2]);
	translate([w0-2*thn, 0, boxheight+4*thn])
		prismx([2*thn, d0, 2*thn]);
	// back
	translate([0, d0-2*thn, 0])
	difference() {
		cube([w0, 2*thn, boxheight+4*thn]);
		translate([thn, -1, boxheight+thn])
			cube([w0+2, thn+1, 3*thn]);
	}
	translate([0, d0-2*thn, boxheight+2*thn+thn/2])
		prismzy([w0, thn, thn+thn/2]);
	translate([0, d0-2*thn, boxheight+4*thn])
		prismy([w0, 2*thn, 2*thn]);
	// front
	cube([w0, 2*thn, boxheight]);
	
	// and now - the parts in the middle
	for (iline = [0 : len(config)-1]) {
		line = config[iline];
		newline = [for (shelf = line) shelf==0 ? 1 : shelf];
		y = d0 - 2*thn - iline*boxsize - iline*thn;
		for (ishelf = [0 : len(line)-1]) {
			shelf = line[ishelf];
			ct = ishelf==0 ? 0 : sum(newline, ishelf);
			x = 2*thn + ct*(boxsize+thn);
			translate([x-thn, y-boxsize-thn, 0])
				cube([thn, boxsize+2*thn, boxheight]);
			if (shelf != 0) {
				translate([x, y, 0])
					cube([shelf*(boxsize+thn), thn, boxheight]);
			}
		}
	}
}

module lid() {
	cube([w0-3*thn, d0-thn, thn]);
	translate([thn, 0, thn])
		cube([w0-5*thn, 2*thn, thn/2]);
	y0 = (d0-thn - len(txt)*7) / 2;
	for (iline = [0, len(txt)-1]) {
		line = txt[iline];
		x0 = (w0-2*thn - len(line)*5) / 2;
		translate([x0, y0 + (len(txt)-iline-1)*7, thn])
			scale([thn, thn, thn/2])
				drawtext(line);
	}
}

// Assemble everyting together

if (part==0 || part==1) {
	color([0.1, 0.6, 1])
		box();
}
if (part==0 || part==2) {
	color([0, 0.65, 0.3])
		translate([part==0?thn+thn/2:0, part==0?-3/4*d0:0, part==0?boxheight+thn:0])
			lid();
}
